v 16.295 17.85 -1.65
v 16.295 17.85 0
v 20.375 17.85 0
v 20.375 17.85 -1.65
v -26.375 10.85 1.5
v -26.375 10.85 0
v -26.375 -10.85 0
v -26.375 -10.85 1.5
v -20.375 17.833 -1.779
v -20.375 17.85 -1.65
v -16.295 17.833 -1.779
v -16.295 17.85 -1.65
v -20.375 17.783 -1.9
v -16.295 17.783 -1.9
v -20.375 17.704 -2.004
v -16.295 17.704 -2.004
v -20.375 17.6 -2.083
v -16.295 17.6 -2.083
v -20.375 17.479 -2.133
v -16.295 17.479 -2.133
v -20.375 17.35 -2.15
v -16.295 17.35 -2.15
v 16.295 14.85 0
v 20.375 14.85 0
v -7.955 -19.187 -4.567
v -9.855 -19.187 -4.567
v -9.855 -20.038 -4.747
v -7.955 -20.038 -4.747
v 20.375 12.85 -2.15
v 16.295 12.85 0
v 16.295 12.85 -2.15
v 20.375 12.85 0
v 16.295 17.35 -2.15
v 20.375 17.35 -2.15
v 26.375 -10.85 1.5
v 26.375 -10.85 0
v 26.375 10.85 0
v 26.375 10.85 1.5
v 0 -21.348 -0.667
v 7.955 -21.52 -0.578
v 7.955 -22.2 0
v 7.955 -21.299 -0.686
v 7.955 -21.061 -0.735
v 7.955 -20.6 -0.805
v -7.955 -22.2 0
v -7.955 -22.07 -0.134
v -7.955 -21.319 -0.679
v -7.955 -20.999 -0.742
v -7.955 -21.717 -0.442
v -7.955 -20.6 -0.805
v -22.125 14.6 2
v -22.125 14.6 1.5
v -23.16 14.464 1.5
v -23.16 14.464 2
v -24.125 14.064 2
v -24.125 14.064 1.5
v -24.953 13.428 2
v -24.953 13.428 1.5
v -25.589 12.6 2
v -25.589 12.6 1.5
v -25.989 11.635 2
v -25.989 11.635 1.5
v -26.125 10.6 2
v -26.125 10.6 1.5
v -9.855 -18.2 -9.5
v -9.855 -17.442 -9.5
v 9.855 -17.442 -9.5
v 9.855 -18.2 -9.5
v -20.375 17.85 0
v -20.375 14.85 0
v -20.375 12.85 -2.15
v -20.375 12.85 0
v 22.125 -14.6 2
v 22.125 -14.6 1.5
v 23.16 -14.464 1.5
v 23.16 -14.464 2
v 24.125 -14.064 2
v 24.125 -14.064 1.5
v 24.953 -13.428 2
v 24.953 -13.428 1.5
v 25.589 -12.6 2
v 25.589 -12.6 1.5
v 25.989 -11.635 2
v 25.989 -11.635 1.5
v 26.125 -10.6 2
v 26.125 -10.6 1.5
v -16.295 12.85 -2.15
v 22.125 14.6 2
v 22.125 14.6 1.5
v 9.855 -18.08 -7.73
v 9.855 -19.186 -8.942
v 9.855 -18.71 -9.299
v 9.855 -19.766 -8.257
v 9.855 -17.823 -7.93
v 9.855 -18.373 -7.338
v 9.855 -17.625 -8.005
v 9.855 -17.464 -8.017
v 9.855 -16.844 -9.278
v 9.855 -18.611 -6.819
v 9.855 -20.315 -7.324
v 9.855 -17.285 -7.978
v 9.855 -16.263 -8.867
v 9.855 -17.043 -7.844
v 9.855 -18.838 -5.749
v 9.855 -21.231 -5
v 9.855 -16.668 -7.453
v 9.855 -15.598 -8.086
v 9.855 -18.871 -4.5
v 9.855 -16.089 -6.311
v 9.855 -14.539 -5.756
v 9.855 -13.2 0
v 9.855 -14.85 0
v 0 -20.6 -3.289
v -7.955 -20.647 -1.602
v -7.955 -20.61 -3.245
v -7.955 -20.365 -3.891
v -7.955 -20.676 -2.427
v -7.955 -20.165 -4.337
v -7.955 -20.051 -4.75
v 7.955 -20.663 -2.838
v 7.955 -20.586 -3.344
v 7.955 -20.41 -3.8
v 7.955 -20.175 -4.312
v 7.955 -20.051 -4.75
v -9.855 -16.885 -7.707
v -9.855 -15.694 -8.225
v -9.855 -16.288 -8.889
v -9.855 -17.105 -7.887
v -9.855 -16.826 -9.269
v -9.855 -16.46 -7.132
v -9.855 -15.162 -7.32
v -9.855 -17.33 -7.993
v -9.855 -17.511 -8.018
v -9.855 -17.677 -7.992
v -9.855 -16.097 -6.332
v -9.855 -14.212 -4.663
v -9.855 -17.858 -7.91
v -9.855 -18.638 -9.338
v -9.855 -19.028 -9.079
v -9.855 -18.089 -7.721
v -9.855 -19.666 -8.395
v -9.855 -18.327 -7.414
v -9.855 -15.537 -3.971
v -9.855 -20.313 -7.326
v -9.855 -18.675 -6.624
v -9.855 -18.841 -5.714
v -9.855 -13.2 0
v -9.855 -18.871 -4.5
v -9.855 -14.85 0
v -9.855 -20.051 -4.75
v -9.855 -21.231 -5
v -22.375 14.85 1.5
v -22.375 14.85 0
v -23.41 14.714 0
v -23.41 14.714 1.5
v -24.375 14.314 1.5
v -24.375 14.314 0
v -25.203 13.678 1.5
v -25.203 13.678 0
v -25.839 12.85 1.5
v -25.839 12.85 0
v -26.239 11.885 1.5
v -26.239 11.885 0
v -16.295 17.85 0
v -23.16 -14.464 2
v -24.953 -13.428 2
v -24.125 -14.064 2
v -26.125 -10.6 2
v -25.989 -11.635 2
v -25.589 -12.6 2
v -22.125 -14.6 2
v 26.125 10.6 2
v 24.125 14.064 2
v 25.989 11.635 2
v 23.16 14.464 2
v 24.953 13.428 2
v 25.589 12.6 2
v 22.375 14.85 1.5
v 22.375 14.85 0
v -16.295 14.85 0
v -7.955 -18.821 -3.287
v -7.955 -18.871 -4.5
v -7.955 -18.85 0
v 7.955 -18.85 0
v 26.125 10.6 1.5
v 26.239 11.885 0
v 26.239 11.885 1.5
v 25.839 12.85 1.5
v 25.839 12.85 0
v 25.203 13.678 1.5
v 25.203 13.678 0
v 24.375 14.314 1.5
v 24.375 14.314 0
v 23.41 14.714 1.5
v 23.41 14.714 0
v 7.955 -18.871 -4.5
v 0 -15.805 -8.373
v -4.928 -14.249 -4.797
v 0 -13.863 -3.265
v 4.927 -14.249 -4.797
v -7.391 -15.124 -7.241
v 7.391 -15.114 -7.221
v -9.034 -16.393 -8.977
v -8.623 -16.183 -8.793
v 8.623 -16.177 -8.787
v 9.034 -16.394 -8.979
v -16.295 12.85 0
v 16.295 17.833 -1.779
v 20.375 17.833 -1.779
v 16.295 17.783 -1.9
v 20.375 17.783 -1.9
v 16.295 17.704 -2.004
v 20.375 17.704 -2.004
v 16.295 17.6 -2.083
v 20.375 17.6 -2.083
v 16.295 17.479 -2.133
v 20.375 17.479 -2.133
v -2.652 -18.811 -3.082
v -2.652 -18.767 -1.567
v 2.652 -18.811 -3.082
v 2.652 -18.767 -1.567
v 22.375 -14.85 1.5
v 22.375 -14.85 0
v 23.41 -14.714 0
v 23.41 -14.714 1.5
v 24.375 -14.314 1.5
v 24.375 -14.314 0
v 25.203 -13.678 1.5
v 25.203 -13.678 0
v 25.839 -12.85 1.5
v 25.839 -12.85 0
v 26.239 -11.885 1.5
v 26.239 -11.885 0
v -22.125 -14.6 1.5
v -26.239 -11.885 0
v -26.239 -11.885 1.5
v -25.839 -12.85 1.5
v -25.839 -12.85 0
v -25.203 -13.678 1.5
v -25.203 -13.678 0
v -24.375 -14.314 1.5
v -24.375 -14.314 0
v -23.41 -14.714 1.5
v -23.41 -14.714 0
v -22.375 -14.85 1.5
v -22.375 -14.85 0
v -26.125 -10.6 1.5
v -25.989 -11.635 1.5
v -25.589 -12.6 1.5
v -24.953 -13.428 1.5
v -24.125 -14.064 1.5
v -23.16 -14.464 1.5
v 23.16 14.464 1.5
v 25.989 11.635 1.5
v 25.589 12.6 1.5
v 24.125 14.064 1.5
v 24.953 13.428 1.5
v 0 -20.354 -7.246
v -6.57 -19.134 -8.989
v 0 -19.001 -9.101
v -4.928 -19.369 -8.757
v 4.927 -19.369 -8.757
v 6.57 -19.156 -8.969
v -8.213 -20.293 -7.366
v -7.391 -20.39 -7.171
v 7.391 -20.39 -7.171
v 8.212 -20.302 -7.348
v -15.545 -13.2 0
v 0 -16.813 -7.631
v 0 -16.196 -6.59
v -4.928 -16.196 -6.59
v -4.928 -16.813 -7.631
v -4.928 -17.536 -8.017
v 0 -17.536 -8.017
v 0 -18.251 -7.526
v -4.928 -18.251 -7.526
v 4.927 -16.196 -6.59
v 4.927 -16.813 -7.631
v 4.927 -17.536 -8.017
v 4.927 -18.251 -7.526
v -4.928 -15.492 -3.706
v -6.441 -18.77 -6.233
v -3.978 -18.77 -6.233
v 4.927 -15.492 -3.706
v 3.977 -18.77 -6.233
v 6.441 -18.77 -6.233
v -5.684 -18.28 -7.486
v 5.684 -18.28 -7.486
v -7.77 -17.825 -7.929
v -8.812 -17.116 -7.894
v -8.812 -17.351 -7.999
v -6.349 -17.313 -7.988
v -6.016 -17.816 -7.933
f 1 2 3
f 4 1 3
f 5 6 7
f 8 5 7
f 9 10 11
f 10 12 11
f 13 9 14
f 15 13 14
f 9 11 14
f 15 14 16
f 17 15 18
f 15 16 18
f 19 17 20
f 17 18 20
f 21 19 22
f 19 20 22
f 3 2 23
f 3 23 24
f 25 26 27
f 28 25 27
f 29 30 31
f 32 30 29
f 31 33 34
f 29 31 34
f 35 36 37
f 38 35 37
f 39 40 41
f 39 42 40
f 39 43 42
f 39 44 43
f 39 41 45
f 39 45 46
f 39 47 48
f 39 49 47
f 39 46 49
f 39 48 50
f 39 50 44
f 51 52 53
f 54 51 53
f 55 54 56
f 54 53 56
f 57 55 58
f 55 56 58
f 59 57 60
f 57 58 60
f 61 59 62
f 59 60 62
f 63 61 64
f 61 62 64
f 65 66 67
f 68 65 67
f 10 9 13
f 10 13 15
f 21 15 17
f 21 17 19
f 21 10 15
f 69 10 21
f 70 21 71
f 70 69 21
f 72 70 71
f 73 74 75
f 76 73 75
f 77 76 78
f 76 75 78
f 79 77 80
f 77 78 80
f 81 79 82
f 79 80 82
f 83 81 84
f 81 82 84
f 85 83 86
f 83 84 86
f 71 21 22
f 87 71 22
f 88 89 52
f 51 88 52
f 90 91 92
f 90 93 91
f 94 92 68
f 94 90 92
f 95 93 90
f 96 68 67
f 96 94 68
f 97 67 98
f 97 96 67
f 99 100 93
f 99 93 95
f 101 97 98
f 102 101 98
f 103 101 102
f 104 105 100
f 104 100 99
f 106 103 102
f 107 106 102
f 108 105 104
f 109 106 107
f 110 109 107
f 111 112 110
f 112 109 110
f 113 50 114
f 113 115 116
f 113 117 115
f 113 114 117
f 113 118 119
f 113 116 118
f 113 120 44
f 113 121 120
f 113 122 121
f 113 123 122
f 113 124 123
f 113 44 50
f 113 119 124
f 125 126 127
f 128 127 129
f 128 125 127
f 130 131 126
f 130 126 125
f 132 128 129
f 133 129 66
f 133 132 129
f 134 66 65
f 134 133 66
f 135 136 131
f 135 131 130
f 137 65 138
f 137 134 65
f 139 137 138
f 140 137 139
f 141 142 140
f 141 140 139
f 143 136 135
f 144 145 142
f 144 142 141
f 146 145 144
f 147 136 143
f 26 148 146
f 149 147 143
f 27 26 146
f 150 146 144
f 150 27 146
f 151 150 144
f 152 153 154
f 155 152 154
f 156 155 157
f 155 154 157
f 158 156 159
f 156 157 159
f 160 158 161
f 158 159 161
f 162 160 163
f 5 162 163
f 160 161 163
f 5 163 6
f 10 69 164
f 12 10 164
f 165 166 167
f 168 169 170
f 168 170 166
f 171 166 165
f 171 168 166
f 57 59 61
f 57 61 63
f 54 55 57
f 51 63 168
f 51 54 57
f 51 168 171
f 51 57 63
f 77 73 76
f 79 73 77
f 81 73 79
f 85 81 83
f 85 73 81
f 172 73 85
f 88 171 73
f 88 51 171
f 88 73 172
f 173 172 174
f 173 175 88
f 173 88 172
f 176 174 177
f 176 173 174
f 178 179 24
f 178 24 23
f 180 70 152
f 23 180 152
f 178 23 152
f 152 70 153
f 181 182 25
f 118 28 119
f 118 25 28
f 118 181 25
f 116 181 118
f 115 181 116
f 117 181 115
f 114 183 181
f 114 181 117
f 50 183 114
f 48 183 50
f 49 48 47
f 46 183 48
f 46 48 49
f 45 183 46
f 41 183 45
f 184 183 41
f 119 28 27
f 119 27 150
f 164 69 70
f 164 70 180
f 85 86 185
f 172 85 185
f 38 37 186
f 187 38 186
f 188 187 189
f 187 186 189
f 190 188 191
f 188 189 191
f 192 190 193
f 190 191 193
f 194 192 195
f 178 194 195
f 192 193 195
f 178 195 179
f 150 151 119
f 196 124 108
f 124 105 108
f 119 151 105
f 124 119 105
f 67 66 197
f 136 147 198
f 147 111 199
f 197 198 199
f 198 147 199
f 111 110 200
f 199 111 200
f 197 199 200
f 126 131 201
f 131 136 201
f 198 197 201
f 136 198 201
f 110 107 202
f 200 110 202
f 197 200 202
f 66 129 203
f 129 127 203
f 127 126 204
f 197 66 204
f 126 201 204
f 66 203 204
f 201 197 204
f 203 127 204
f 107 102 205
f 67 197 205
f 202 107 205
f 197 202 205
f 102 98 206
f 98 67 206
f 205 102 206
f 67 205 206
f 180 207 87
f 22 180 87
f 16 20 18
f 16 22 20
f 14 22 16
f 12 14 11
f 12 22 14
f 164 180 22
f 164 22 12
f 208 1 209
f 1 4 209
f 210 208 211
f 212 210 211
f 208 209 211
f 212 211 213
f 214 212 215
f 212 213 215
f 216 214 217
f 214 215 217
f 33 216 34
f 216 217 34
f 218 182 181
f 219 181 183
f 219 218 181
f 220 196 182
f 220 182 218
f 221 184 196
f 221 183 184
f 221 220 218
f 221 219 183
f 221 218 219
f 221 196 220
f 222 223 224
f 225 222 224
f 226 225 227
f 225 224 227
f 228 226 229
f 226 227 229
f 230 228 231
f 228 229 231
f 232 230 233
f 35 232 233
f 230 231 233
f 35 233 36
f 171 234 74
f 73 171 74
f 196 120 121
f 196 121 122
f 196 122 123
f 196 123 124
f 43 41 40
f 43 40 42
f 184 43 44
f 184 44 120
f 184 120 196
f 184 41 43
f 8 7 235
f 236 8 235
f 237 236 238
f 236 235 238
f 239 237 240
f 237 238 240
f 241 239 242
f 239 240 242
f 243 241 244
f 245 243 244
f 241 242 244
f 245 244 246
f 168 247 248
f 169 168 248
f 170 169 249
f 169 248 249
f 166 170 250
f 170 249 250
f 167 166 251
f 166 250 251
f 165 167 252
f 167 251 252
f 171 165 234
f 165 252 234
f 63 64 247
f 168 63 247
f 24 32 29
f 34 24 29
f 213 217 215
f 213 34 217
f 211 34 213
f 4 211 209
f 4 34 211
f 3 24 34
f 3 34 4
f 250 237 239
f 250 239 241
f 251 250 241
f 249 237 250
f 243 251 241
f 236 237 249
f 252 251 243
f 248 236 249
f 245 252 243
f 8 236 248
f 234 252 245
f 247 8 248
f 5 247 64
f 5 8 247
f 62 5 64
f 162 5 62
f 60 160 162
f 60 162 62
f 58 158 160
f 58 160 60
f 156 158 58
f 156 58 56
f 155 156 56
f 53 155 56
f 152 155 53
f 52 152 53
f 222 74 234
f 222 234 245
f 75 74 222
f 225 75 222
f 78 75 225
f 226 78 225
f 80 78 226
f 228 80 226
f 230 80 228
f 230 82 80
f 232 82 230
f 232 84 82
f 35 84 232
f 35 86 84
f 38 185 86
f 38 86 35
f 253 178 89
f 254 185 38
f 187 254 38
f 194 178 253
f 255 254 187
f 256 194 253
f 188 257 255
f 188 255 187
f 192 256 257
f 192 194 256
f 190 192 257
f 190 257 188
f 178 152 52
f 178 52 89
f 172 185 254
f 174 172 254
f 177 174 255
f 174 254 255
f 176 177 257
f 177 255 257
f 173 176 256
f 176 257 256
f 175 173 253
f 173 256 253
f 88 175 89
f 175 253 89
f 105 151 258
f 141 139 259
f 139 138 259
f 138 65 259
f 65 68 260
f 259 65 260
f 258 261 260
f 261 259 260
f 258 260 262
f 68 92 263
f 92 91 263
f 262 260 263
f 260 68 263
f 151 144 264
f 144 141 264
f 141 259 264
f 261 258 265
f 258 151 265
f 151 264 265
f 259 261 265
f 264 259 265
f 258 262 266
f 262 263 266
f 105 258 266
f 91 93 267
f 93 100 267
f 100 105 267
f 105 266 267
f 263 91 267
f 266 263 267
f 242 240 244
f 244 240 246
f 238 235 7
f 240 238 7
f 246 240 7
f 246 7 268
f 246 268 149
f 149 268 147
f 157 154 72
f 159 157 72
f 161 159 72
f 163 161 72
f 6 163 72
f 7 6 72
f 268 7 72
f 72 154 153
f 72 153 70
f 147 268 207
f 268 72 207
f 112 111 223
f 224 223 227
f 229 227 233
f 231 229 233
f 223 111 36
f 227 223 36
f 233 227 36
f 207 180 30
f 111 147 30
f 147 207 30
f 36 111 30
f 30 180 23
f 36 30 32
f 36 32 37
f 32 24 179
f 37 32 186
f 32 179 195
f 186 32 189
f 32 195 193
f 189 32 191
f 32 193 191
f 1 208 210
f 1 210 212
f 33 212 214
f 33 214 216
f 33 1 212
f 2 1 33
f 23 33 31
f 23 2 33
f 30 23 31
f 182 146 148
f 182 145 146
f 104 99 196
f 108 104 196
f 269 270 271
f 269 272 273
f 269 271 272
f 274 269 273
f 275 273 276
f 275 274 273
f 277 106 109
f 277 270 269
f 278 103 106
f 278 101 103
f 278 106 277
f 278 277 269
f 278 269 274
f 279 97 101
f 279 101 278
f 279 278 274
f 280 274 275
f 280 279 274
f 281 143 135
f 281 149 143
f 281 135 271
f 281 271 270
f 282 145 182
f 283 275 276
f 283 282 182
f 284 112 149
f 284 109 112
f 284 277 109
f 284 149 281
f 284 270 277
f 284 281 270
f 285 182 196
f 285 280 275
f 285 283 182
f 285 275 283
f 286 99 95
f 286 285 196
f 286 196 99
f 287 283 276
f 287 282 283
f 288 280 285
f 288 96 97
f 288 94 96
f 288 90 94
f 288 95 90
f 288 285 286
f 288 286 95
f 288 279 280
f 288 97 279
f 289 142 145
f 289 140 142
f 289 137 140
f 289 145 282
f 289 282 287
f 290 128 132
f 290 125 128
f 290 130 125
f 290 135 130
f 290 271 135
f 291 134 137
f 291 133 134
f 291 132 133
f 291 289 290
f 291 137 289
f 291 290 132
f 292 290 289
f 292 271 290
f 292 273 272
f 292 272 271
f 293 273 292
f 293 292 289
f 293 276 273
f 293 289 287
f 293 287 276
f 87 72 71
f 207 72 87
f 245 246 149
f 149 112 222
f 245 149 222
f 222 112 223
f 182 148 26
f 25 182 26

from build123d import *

# Parameters (mm, degrees)
F1_DEPTH  = 1.5
F3_DEPTH  = 0.5
F4_W      = 4.08
F4_H      = 3
F4_H_2    = 2
F5_DEPTH  = 2.15
F4_W_2    = 19.71
F4_H_3    = 8.35
F4_H_4    = 1.65
F6_DEPTH  = 9.5
F8_DEPTH  = 25.4
F9_DEPTH  = 25.4
F10_DEPTH = 25.4
F11_DEPTH = 25.4
F12_DEPTH = 1.9
F14_DEPTH = 1.9
F15_R     = 0.5


with BuildPart() as f1:
    # F0 (on Top) → F1 (new body)
    with BuildSketch(Plane.XY):
        with BuildLine():
            ThreePointArc((26.375, 10.85), (25.2034271247, 13.6784271247), (22.375, 14.85))
            Line((22.375, 14.85), (-22.375, 14.85))
            ThreePointArc((-22.375, 14.85), (-25.2034271247, 13.6784271247), (-26.375, 10.85))
            Line((-26.375, 10.85), (-26.375, -10.85))
            ThreePointArc((-26.375, -10.85), (-25.2034271247, -13.6784271247), (-22.375, -14.85))
            Line((-22.375, -14.85), (22.375, -14.85))
            ThreePointArc((22.375, -14.85), (25.2034271247, -13.6784271247), (26.375, -10.85))
            Line((26.375, -10.85), (26.375, 10.85))
        make_face()
    extrude(amount=F1_DEPTH)

    # F2 (on face) → F3 (join)
    with BuildSketch(Plane.XY.offset(1.5)):
        with BuildLine():
            ThreePointArc((26.125, 10.6), (24.9534271247, 13.4284271247), (22.125, 14.6))
            Line((22.125, 14.6), (-22.125, 14.6))
            ThreePointArc((-22.125, 14.6), (-24.9534271247, 13.4284271247), (-26.125, 10.6))
            Line((-26.125, 10.6), (-26.125, -10.6))
            ThreePointArc((-26.125, -10.6), (-24.9534271247, -13.4284271247), (-22.125, -14.6))
            Line((-22.125, -14.6), (22.125, -14.6))
            ThreePointArc((22.125, -14.6), (24.9534271247, -13.4284271247), (26.125, -10.6))
            Line((26.125, -10.6), (26.125, 10.6))
        make_face()
    extrude(amount=F3_DEPTH)

    # F4 (on face) → F5 (join)
    with BuildSketch(Plane.XY):
        with Locations((-18.335, 16.35)):
            Rectangle(F4_W, F4_H)
        with Locations((-18.335, 13.85)):
            Rectangle(F4_W, F4_H_2)
        with Locations((18.335, 13.85)):
            Rectangle(F4_W, F4_H_2)
        with Locations((18.335, 16.35)):
            Rectangle(F4_W, F4_H)
    extrude(amount=-F5_DEPTH)

    # F4 (on face) → F6 (join)
    with BuildSketch(Plane.XY):
        with Locations((0, -19.025)):
            Rectangle(F4_W_2, F4_H_3)
        with Locations((0, -14.025)):
            Rectangle(F4_W_2, F4_H_4)
    extrude(amount=-F6_DEPTH)

    # F7 (on face) → F8 (cut)
    with BuildSketch(Plane.YZ.offset(9.855)):
        with BuildLine():
            add(Edge.make_bspline(
                [(-18.2, -9.5), (-19.0467439554, -9.3105263347), (-20.1329314913, -7.9995740948), (-20.9745336298, -5.8262032925), (-21.2309185806, -5)],
                knots=[0.5048432027, 0.5048432027, 0.5048432027, 0.5048432027, 0.6991234522, 0.8042040894, 0.8042040894, 0.8042040894, 0.8042040894], degree=3))
            add(Edge.make_bspline(
                [(-21.2309185806, -5), (-21.7086386079, -3.4605420158), (-22.0508473288, -1.7012665692), (-22.2, 0)],
                knots=[0.8042040894, 0.8042040894, 0.8042040894, 0.8042040894, 1, 1, 1, 1], degree=3))
            Line((-22.2, 0), (-23.2, 0))
            Line((-23.2, 0), (-23.2, -9.5))
            Line((-23.2, -9.5), (-18.2, -9.5))
        make_face()
    extrude(amount=-F8_DEPTH, mode=Mode.SUBTRACT)

    # F7 (on face) → F9 (cut)
    with BuildSketch(Plane.YZ.offset(9.855)):
        with BuildLine():
            Line((-14.85, 0), (-18.85, 0))
            add(Edge.make_bspline(
                [(-18.8713932454, -4.5), (-18.8407563671, -3.1458271018), (-18.6661081701, -1.5784759436), (-18.85, 0)],
                knots=[0.789016397, 0.789016397, 0.789016397, 0.789016397, 1, 1, 1, 1], degree=3))
            add(Edge.make_bspline(
                [(-14.85, 0), (-15.4145938047, -2.6608863681), (-15.6218993367, -6.3008263141), (-17.5538748145, -8.6715731519), (-18.8298088893, -6.876353813), (-18.8868431725, -5.1828983108), (-18.8713932454, -4.5)],
                knots=[0, 0, 0, 0, 0.3263667999, 0.5024195639, 0.6826190926, 0.789016397, 0.789016397, 0.789016397, 0.789016397], degree=3))
        make_face()
    extrude(amount=-F9_DEPTH, mode=Mode.SUBTRACT)

    # F7 (on face) → F10 (cut)
    with BuildSketch(Plane.YZ.offset(9.855)):
        with BuildLine():
            add(Edge.make_bspline(
                [(-13.2, 0), (-13.822723688, -3.2937158649), (-14.7625971483, -7.9965886058), (-16.8744215828, -9.380788847), (-17.4416645725, -9.5)],
                knots=[0, 0, 0, 0, 0.3258242382, 0.4488307078, 0.4488307078, 0.4488307078, 0.4488307078], degree=3))
            Line((-17.4416645725, -9.5), (-13.2, -9.5))
            Line((-13.2, -9.5), (-13.2, 0))
        make_face()
    extrude(amount=-F10_DEPTH, mode=Mode.SUBTRACT)

    # F7 (on face) → F11 (cut)
    with BuildSketch(Plane.YZ.offset(9.855)):
        with BuildLine():
            add(Edge.make_bspline(
                [(-21.2309185806, -5), (-21.7086386079, -3.4605420158), (-22.0508473288, -1.7012665692), (-22.2, 0)],
                knots=[0.8042040894, 0.8042040894, 0.8042040894, 0.8042040894, 1, 1, 1, 1], degree=3))
            Line((-21.2309185806, -5), (-20.051155913, -4.75))
            add(Edge.make_bspline(
                [(-20.6, -0.8051507757), (-20.6309029539, -1.5331994881), (-20.8508854026, -3.4899190921), (-20.1828452771, -4.0737474943), (-20.051155913, -4.75)],
                knots=[0, 0, 0, 0, 0.5578277519, 1, 1, 1, 1], degree=3))
            add(Edge.make_bspline(
                [(-22.2, 0), (-22.021752265, -0.1914355168), (-21.34457939, -0.8364756071), (-20.8800740764, -0.7184244385), (-20.6, -0.8051507757)],
                knots=[0, 0, 0, 0, 0.5439991963, 1, 1, 1, 1], degree=3))
        make_face()
    extrude(amount=-F11_DEPTH, mode=Mode.SUBTRACT)

    # F7 (on face) → F12 (cut)
    with BuildSketch(Plane.YZ.offset(9.855)):
        with BuildLine():
            Line((-18.85, 0), (-22.2, 0))
            add(Edge.make_bspline(
                [(-22.2, 0), (-22.021752265, -0.1914355168), (-21.34457939, -0.8364756071), (-20.8800740764, -0.7184244385), (-20.6, -0.8051507757)],
                knots=[0, 0, 0, 0, 0.5439991963, 1, 1, 1, 1], degree=3))
            add(Edge.make_bspline(
                [(-20.6, -0.8051507757), (-20.6309029539, -1.5331994881), (-20.8508854026, -3.4899190921), (-20.1828452771, -4.0737474943), (-20.051155913, -4.75)],
                knots=[0, 0, 0, 0, 0.5578277519, 1, 1, 1, 1], degree=3))
            Line((-20.051155913, -4.75), (-18.8713932454, -4.5))
            add(Edge.make_bspline(
                [(-18.8713932454, -4.5), (-18.8407563671, -3.1458271018), (-18.6661081701, -1.5784759436), (-18.85, 0)],
                knots=[0.789016397, 0.789016397, 0.789016397, 0.789016397, 1, 1, 1, 1], degree=3))
        make_face()
    extrude(amount=-F12_DEPTH, mode=Mode.SUBTRACT)

    # F13 (on face) → F14 (cut)
    with BuildSketch(Plane(origin=(-9.855, 0, 0), x_dir=(0, -1, 0), z_dir=(-1, 0, 0))):
        with BuildLine():
            Line((20.0378884491, -4.7471885312), (20.051155913, -4.75))
            add(Edge.make_bspline(
                [(20.051155913, -4.75), (20.0589857611, -4.7097920877), (20.0674564332, -4.6697547253), (20.0765868052, -4.629908391), (20.0863933528, -4.5902740901), (20.0968875724, -4.5508725034), (20.1080734026, -4.5117231353), (20.1418817725, -4.4009968751), (20.1661686112, -4.3300403811), (20.1927551228, -4.2601282228), (20.2214794477, -4.1913122549), (20.2520262571, -4.1235210989), (20.2838500374, -4.0565219368), (20.3232108532, -3.9757663577), (20.3301650097, -3.9615765963), (20.3371409196, -3.9474033553), (20.3441319527, -3.9332429305), (20.3511312875, -3.9190914551), (20.3581319113, -3.9049448998), (20.3651266201, -3.8907990727)],
                knots=[0, 0, 0, 0, 0, 0, 0, 0, 0.0701472659, 0.0701472659, 0.0701472659, 0.0701472659, 0.0701472659, 0.0701472659, 0.1997739124, 0.1997739124, 0.1997739124, 0.1997739124, 0.1997739124, 0.1997739124, 0.227453691, 0.227453691, 0.227453691, 0.227453691, 0.227453691, 0.227453691, 0.227453691, 0.227453691], degree=7))
            add(Edge.make_bspline(
                [(20.3651266201, -3.8907990727), (20.2923732044, -3.9469893956), (20.0498312814, -4.1600578166), (19.9785290709, -4.465871509), (20.0378884491, -4.7471885312)],
                knots=[3.3352473479, 3.3352473479, 3.3352473479, 3.3352473479, 3.6014620339, 4.288683164, 4.288683164, 4.288683164, 4.288683164], degree=3))
        make_face()
        with BuildLine():
            Line((19.1865132018, -4.5667761333), (20.0378884491, -4.7471885312))
            add(Edge.make_bspline(
                [(20.3651266201, -3.8907990727), (20.2923732044, -3.9469893956), (20.0498312814, -4.1600578166), (19.9785290709, -4.465871509), (20.0378884491, -4.7471885312)],
                knots=[3.3352473479, 3.3352473479, 3.3352473479, 3.3352473479, 3.6014620339, 4.288683164, 4.288683164, 4.288683164, 4.288683164], degree=3))
            add(Edge.make_bspline(
                [(20.3651266201, -3.8907990727), (20.3652925358, -3.8904635312), (20.3654584482, -3.8901279902), (20.3656243571, -3.8897924495), (20.3657902625, -3.889456909), (20.3659561644, -3.8891213689), (20.3661220625, -3.8887858289), (20.3713416007, -3.8782287262), (20.3763917236, -3.8680073132), (20.3814356082, -3.8577844748), (20.3864705184, -3.8475586358), (20.3914936992, -3.8373282211), (20.3965023768, -3.8270916558), (20.4144692424, -3.7902165332), (20.4273277463, -3.7635338368), (20.4400206781, -3.7367712884), (20.4524989775, -3.709902642), (20.4647148079, -3.6829043352), (20.4766232471, -3.655756431), (20.5067795166, -3.5845105727), (20.5244774515, -3.5401460021), (20.541104477, -3.4952960694), (20.5565213512, -3.4499316007), (20.5706349892, -3.4040539743), (20.5833986563, -3.3576957084), (20.5998748454, -3.2900950162), (20.6046813043, -3.2691903931), (20.609204773, -3.2482009599), (20.6134948517, -3.227146708), (20.6175398341, -3.2060269198), (20.6213657385, -3.1848526801), (20.6372039955, -3.091846631), (20.6470136755, -3.0195059493), (20.6548666939, -2.9467874693), (20.6610708494, -2.8738168031), (20.6658588693, -2.8006775838), (20.6694244023, -2.7274178583), (20.6755601658, -2.5469844123), (20.6769210939, -2.4397334438), (20.6764794737, -2.3323859939), (20.6745662387, -2.2250049078), (20.6714409356, -2.1176310351), (20.6673316749, -2.0102860121), (20.660478022, -1.8599303262), (20.6583902963, -1.8168947561), (20.6561900649, -1.7738671435), (20.6538900562, -1.7308485214), (20.6515027419, -1.6878398889), (20.649040571, -1.6448422291), (20.6465162034, -1.6018565276)],
                knots=[0.227453691, 0.227453691, 0.227453691, 0.227453691, 0.227453691, 0.227453691, 0.227453691, 0.227453691, 0.2281102601, 0.2281102601, 0.2281102601, 0.2281102601, 0.2281102601, 0.2281102601, 0.24811135, 0.24811135, 0.24811135, 0.24811135, 0.24811135, 0.24811135, 0.3001057386, 0.3001057386, 0.3001057386, 0.3001057386, 0.3001057386, 0.3001057386, 0.3837391607, 0.3837391607, 0.3837391607, 0.3837391607, 0.3837391607, 0.3837391607, 0.4209624028, 0.4209624028, 0.4209624028, 0.4209624028, 0.4209624028, 0.4209624028, 0.5468509231, 0.5468509231, 0.5468509231, 0.5468509231, 0.5468509231, 0.5468509231, 0.7305556094, 0.7305556094, 0.7305556094, 0.7305556094, 0.7305556094, 0.7305556094, 0.8042380207, 0.8042380207, 0.8042380207, 0.8042380207, 0.8042380207, 0.8042380207, 0.8042380207, 0.8042380207], degree=7))
            add(Edge.make_bspline(
                [(20.6, -0.8051507757), (20.5613649055, -1.0322758666), (20.5772163889, -1.2973036751), (20.6410101063, -1.5787167701), (20.6465162034, -1.6018565276)],
                knots=[0, 0, 0, 0, 0.7282402744, 0.7931964139, 0.7931964139, 0.7931964139, 0.7931964139], degree=3))
            add(Edge.make_bspline(
                [(20.9991057889, -0.7416468993), (20.9592728425, -0.7301565498), (20.8220313096, -0.699983524), (20.6903609526, -0.7384588517), (20.6, -0.8051507757)],
                knots=[1.5561655905, 1.5561655905, 1.5561655905, 1.5561655905, 1.6760652117, 1.9692595941, 1.9692595941, 1.9692595941, 1.9692595941], degree=3))
            add(Edge.make_bspline(
                [(20.9991057889, -0.7416468993), (21.0018159449, -0.7414031777), (21.0045257326, -0.7411578671), (21.0072351577, -0.740910824), (21.0099442255, -0.7406619047), (21.0126529413, -0.7404109655), (21.0153613103, -0.7401578625), (21.0180693376, -0.7399024515), (21.0375384991, -0.7380483329), (21.0542867078, -0.7363581789), (21.0710231722, -0.7345401107), (21.0877483889, -0.7325603549), (21.104461824, -0.7303860252), (21.1211619051, -0.7279857666), (21.137846013, -0.7253304002), (21.1787532558, -0.7181211815), (21.2029571594, -0.7132526524), (21.22710557, -0.7077075247), (21.251178971, -0.7014182819), (21.2751551853, -0.6943343572), (21.2990094679, -0.6864244774), (21.3227144456, -0.6776773383), (21.3912145071, -0.6497923866), (21.43549452, -0.628448223), (21.4790992276, -0.6048089523), (21.5220195614, -0.5793468432), (21.5642587373, -0.5524077139), (21.6058418345, -0.5242508404), (21.6468131809, -0.4950496177), (21.7124884675, -0.4460965112), (21.737506514, -0.4269266559), (21.7622997408, -0.4074426066), (21.7868715943, -0.3876760423), (21.8112238209, -0.36765495), (21.835356514, -0.3474044919), (21.8592681613, -0.3269478723), (21.9071685483, -0.285208783), (21.9311359694, -0.2639277816), (21.9548620733, -0.2424817194), (21.9783439347, -0.2208903242), (22.0015734403, -0.1991751296), (22.0245346788, -0.1773623394), (22.0472039759, -0.1554833002), (22.0695454706, -0.1335784594)],
                knots=[0.2229980472, 0.2229980472, 0.2229980472, 0.2229980472, 0.2229980472, 0.2229980472, 0.2229980472, 0.2229980472, 0.2229980472, 0.235216929, 0.235216929, 0.235216929, 0.235216929, 0.235216929, 0.235216929, 0.235216929, 0.310855725, 0.310855725, 0.310855725, 0.310855725, 0.310855725, 0.310855725, 0.310855725, 0.4208919894, 0.4208919894, 0.4208919894, 0.4208919894, 0.4208919894, 0.4208919894, 0.4208919894, 0.6312529006, 0.6312529006, 0.6312529006, 0.6312529006, 0.6312529006, 0.6312529006, 0.6312529006, 0.7626298331, 0.7626298331, 0.7626298331, 0.7626298331, 0.7626298331, 0.7626298331, 0.7626298331, 0.8969203539, 0.8969203539, 0.8969203539, 0.8969203539, 0.8969203539, 0.8969203539, 0.8969203539, 0.8969203539, 0.8969203539], degree=8))
            add(Edge.make_bspline(
                [(22.2, 0), (22.1557451499, -0.0395755652), (22.1122969775, -0.0840429257), (22.0695454706, -0.1335784594)],
                knots=[0, 0, 0, 0, 0.1902494763, 0.1902494763, 0.1902494763, 0.1902494763], degree=3))
            Line((22.2, 0), (18.85, 0))
            add(Edge.make_bspline(
                [(18.85, 0), (18.8041285234, -0.3937479028), (18.7758085808, -0.7894835109), (18.7623451707, -1.1860157865), (18.7608009494, -1.5825878818), (18.7682857506, -1.9788864083), (18.785468482, -2.4902466637), (18.7898321752, -2.6054346786), (18.7946093212, -2.7206051301), (18.799718478, -2.8357595323), (18.8050745896, -2.9509007431), (18.8123523874, -3.1028850541), (18.8141331269, -3.1397361515), (18.8159270051, -3.1765864439), (18.8177310212, -3.2134360696), (18.8195421073, -3.2502851717), (18.8213571287, -3.2871338975)],
                knots=[0, 0, 0, 0, 0, 0, 0, 0.5278695798, 0.5278695798, 0.5278695798, 0.5278695798, 0.5278695798, 0.6813794986, 0.6813794986, 0.6813794986, 0.6813794986, 0.6813794986, 0.7305156181, 0.7305156181, 0.7305156181, 0.7305156181, 0.7305156181, 0.7305156181, 0.7305156181], degree=6))
            add(Edge.make_bspline(
                [(19.1865132018, -4.5667761333), (19.0849025154, -4.1217046012), (18.9454363675, -3.7042708733), (18.8213571287, -3.2871338975)],
                knots=[15.3483435034, 15.3483435034, 15.3483435034, 15.3483435034, 16.7073787198, 16.7073787198, 16.7073787198, 16.7073787198], degree=3))
        make_face()
        with BuildLine():
            Line((18.8713932454, -4.5), (19.1865132018, -4.5667761333))
            add(Edge.make_bspline(
                [(19.1865132018, -4.5667761333), (19.0849025154, -4.1217046012), (18.9454363675, -3.7042708733), (18.8213571287, -3.2871338975)],
                knots=[15.3483435034, 15.3483435034, 15.3483435034, 15.3483435034, 16.7073787198, 16.7073787198, 16.7073787198, 16.7073787198], degree=3))
            add(Edge.make_bspline(
                [(18.8213571287, -3.2871338975), (18.8234567809, -3.3297612222), (18.8255616994, -3.3723880433), (18.8276670315, -3.4150145889), (18.8297678045, -3.4576410948), (18.8318589258, -3.5002678049), (18.8369559593, -3.6049138465), (18.8399452005, -3.6669336481), (18.8428868298, -3.7289551465), (18.8457639747, -3.7909790554), (18.8485589666, -3.8530060314), (18.8554869159, -4.0125032039), (18.8594720136, -4.1099784592), (18.8631366493, -4.2074652335), (18.8664032639, -4.3049647894), (18.8691868781, -4.4024769185), (18.8713932454, -4.5)],
                knots=[0.7305156181, 0.7305156181, 0.7305156181, 0.7305156181, 0.7305156181, 0.7305156181, 0.7305156181, 0.7873572394, 0.7873572394, 0.7873572394, 0.7873572394, 0.7873572394, 0.8700569312, 0.8700569312, 0.8700569312, 0.8700569312, 0.8700569312, 1, 1, 1, 1, 1, 1, 1], degree=6))
        make_face()
        with BuildLine():
            add(Edge.make_bspline(
                [(20.6, -0.8051507757), (20.5613649055, -1.0322758666), (20.5772163889, -1.2973036751), (20.6410101063, -1.5787167701), (20.6465162034, -1.6018565276)],
                knots=[0, 0, 0, 0, 0.7282402744, 0.7931964139, 0.7931964139, 0.7931964139, 0.7931964139], degree=3))
            add(Edge.make_bspline(
                [(20.6465162034, -1.6018565276), (20.6454874073, -1.5843378735), (20.6444482807, -1.5668212056), (20.6433996806, -1.5493065906), (20.6423424697, -1.5317940952), (20.6412775194, -1.5142837865), (20.6402057118, -1.496775732), (20.6346132485, -1.4059397594), (20.6299941701, -1.3326518291), (20.6253361607, -1.2594097858), (20.6207110068, -1.1862201726), (20.6161978814, -1.1130924918), (20.6118930639, -1.0400403627), (20.6066693408, -0.9439168342), (20.6054447252, -0.9207596352), (20.6042585866, -0.8976129266), (20.6031155769, -0.8744775635), (20.6020208919, -0.8513545797), (20.6009802717, -0.8282451869), (20.6, -0.8051507757)],
                knots=[0.8042380207, 0.8042380207, 0.8042380207, 0.8042380207, 0.8042380207, 0.8042380207, 0.8042380207, 0.8042380207, 0.8342669986, 0.8342669986, 0.8342669986, 0.8342669986, 0.8342669986, 0.8342669986, 0.9600562049, 0.9600562049, 0.9600562049, 0.9600562049, 0.9600562049, 0.9600562049, 1, 1, 1, 1, 1, 1, 1, 1], degree=7))
        make_face()
        with BuildLine():
            add(Edge.make_bspline(
                [(20.9991057889, -0.7416468993), (20.9592728425, -0.7301565498), (20.8220313096, -0.699983524), (20.6903609526, -0.7384588517), (20.6, -0.8051507757)],
                knots=[1.5561655905, 1.5561655905, 1.5561655905, 1.5561655905, 1.6760652117, 1.9692595941, 1.9692595941, 1.9692595941, 1.9692595941], degree=3))
            add(Edge.make_bspline(
                [(20.6, -0.8051507757), (20.6357983312, -0.7940656436), (20.6717568885, -0.7844174379), (20.7077937642, -0.7761910472), (20.7438427247, -0.7693108375), (20.7798531645, -0.7636357507), (20.8157901974, -0.7589622849), (20.8516348851, -0.7550353533), (20.8965863081, -0.7506743043), (20.9057821139, -0.7498119471), (20.9149720884, -0.748974999), (20.9241563382, -0.7481584013), (20.93333501, -0.7473569911), (20.9425082907, -0.7465655013), (20.9516764072, -0.7457785607), (20.9656273652, -0.7445790375), (20.9704137565, -0.7441671385), (20.9751988374, -0.7437542175), (20.9799826436, -0.7433394936), (20.9847652094, -0.7429221844), (20.9895465679, -0.7425015061), (20.9943267509, -0.7420766732), (20.9991057889, -0.7416468993)],
                knots=[0, 0, 0, 0, 0, 0, 0, 0, 0, 0.1602137189, 0.1602137189, 0.1602137189, 0.1602137189, 0.1602137189, 0.1602137189, 0.1602137189, 0.2014515012, 0.2014515012, 0.2014515012, 0.2014515012, 0.2014515012, 0.2014515012, 0.2014515012, 0.2229980472, 0.2229980472, 0.2229980472, 0.2229980472, 0.2229980472, 0.2229980472, 0.2229980472, 0.2229980472, 0.2229980472], degree=8))
        make_face()
        with BuildLine():
            add(Edge.make_bspline(
                [(22.0695454706, -0.1335784594), (22.0819512565, -0.1214151387), (22.0942559691, -0.1092438625), (22.1064534685, -0.0970715557), (22.1185364564, -0.0849060086), (22.130496242, -0.0727560855), (22.1423223785, -0.0606320358), (22.1540020519, -0.0485460024), (22.1699223859, -0.0319121785), (22.1743015208, -0.0273196696), (22.1786553865, -0.0227363366), (22.1829828315, -0.0181632572), (22.1872825506, -0.013601651), (22.1915530853, -0.0090528797), (22.1957928235, -0.0045184474), (22.2, 0)],
                knots=[0.8969203539, 0.8969203539, 0.8969203539, 0.8969203539, 0.8969203539, 0.8969203539, 0.8969203539, 0.8969203539, 0.8969203539, 0.9714891983, 0.9714891983, 0.9714891983, 0.9714891983, 0.9714891983, 0.9714891983, 0.9714891983, 1, 1, 1, 1, 1, 1, 1, 1, 1], degree=8))
            add(Edge.make_bspline(
                [(22.2, 0), (22.1557451499, -0.0395755652), (22.1122969775, -0.0840429257), (22.0695454706, -0.1335784594)],
                knots=[0, 0, 0, 0, 0.1902494763, 0.1902494763, 0.1902494763, 0.1902494763], degree=3))
        make_face()
    extrude(amount=-F14_DEPTH, mode=Mode.SUBTRACT)

    # F15
    f15_edges = [f1.edges().sort_by_distance(p)[0] for p in [
        (18.335, 17.85, -2.15),
        (-18.335, 17.85, -2.15),
    ]]
    fillet(f15_edges, radius=F15_R)


solid = f1.part
